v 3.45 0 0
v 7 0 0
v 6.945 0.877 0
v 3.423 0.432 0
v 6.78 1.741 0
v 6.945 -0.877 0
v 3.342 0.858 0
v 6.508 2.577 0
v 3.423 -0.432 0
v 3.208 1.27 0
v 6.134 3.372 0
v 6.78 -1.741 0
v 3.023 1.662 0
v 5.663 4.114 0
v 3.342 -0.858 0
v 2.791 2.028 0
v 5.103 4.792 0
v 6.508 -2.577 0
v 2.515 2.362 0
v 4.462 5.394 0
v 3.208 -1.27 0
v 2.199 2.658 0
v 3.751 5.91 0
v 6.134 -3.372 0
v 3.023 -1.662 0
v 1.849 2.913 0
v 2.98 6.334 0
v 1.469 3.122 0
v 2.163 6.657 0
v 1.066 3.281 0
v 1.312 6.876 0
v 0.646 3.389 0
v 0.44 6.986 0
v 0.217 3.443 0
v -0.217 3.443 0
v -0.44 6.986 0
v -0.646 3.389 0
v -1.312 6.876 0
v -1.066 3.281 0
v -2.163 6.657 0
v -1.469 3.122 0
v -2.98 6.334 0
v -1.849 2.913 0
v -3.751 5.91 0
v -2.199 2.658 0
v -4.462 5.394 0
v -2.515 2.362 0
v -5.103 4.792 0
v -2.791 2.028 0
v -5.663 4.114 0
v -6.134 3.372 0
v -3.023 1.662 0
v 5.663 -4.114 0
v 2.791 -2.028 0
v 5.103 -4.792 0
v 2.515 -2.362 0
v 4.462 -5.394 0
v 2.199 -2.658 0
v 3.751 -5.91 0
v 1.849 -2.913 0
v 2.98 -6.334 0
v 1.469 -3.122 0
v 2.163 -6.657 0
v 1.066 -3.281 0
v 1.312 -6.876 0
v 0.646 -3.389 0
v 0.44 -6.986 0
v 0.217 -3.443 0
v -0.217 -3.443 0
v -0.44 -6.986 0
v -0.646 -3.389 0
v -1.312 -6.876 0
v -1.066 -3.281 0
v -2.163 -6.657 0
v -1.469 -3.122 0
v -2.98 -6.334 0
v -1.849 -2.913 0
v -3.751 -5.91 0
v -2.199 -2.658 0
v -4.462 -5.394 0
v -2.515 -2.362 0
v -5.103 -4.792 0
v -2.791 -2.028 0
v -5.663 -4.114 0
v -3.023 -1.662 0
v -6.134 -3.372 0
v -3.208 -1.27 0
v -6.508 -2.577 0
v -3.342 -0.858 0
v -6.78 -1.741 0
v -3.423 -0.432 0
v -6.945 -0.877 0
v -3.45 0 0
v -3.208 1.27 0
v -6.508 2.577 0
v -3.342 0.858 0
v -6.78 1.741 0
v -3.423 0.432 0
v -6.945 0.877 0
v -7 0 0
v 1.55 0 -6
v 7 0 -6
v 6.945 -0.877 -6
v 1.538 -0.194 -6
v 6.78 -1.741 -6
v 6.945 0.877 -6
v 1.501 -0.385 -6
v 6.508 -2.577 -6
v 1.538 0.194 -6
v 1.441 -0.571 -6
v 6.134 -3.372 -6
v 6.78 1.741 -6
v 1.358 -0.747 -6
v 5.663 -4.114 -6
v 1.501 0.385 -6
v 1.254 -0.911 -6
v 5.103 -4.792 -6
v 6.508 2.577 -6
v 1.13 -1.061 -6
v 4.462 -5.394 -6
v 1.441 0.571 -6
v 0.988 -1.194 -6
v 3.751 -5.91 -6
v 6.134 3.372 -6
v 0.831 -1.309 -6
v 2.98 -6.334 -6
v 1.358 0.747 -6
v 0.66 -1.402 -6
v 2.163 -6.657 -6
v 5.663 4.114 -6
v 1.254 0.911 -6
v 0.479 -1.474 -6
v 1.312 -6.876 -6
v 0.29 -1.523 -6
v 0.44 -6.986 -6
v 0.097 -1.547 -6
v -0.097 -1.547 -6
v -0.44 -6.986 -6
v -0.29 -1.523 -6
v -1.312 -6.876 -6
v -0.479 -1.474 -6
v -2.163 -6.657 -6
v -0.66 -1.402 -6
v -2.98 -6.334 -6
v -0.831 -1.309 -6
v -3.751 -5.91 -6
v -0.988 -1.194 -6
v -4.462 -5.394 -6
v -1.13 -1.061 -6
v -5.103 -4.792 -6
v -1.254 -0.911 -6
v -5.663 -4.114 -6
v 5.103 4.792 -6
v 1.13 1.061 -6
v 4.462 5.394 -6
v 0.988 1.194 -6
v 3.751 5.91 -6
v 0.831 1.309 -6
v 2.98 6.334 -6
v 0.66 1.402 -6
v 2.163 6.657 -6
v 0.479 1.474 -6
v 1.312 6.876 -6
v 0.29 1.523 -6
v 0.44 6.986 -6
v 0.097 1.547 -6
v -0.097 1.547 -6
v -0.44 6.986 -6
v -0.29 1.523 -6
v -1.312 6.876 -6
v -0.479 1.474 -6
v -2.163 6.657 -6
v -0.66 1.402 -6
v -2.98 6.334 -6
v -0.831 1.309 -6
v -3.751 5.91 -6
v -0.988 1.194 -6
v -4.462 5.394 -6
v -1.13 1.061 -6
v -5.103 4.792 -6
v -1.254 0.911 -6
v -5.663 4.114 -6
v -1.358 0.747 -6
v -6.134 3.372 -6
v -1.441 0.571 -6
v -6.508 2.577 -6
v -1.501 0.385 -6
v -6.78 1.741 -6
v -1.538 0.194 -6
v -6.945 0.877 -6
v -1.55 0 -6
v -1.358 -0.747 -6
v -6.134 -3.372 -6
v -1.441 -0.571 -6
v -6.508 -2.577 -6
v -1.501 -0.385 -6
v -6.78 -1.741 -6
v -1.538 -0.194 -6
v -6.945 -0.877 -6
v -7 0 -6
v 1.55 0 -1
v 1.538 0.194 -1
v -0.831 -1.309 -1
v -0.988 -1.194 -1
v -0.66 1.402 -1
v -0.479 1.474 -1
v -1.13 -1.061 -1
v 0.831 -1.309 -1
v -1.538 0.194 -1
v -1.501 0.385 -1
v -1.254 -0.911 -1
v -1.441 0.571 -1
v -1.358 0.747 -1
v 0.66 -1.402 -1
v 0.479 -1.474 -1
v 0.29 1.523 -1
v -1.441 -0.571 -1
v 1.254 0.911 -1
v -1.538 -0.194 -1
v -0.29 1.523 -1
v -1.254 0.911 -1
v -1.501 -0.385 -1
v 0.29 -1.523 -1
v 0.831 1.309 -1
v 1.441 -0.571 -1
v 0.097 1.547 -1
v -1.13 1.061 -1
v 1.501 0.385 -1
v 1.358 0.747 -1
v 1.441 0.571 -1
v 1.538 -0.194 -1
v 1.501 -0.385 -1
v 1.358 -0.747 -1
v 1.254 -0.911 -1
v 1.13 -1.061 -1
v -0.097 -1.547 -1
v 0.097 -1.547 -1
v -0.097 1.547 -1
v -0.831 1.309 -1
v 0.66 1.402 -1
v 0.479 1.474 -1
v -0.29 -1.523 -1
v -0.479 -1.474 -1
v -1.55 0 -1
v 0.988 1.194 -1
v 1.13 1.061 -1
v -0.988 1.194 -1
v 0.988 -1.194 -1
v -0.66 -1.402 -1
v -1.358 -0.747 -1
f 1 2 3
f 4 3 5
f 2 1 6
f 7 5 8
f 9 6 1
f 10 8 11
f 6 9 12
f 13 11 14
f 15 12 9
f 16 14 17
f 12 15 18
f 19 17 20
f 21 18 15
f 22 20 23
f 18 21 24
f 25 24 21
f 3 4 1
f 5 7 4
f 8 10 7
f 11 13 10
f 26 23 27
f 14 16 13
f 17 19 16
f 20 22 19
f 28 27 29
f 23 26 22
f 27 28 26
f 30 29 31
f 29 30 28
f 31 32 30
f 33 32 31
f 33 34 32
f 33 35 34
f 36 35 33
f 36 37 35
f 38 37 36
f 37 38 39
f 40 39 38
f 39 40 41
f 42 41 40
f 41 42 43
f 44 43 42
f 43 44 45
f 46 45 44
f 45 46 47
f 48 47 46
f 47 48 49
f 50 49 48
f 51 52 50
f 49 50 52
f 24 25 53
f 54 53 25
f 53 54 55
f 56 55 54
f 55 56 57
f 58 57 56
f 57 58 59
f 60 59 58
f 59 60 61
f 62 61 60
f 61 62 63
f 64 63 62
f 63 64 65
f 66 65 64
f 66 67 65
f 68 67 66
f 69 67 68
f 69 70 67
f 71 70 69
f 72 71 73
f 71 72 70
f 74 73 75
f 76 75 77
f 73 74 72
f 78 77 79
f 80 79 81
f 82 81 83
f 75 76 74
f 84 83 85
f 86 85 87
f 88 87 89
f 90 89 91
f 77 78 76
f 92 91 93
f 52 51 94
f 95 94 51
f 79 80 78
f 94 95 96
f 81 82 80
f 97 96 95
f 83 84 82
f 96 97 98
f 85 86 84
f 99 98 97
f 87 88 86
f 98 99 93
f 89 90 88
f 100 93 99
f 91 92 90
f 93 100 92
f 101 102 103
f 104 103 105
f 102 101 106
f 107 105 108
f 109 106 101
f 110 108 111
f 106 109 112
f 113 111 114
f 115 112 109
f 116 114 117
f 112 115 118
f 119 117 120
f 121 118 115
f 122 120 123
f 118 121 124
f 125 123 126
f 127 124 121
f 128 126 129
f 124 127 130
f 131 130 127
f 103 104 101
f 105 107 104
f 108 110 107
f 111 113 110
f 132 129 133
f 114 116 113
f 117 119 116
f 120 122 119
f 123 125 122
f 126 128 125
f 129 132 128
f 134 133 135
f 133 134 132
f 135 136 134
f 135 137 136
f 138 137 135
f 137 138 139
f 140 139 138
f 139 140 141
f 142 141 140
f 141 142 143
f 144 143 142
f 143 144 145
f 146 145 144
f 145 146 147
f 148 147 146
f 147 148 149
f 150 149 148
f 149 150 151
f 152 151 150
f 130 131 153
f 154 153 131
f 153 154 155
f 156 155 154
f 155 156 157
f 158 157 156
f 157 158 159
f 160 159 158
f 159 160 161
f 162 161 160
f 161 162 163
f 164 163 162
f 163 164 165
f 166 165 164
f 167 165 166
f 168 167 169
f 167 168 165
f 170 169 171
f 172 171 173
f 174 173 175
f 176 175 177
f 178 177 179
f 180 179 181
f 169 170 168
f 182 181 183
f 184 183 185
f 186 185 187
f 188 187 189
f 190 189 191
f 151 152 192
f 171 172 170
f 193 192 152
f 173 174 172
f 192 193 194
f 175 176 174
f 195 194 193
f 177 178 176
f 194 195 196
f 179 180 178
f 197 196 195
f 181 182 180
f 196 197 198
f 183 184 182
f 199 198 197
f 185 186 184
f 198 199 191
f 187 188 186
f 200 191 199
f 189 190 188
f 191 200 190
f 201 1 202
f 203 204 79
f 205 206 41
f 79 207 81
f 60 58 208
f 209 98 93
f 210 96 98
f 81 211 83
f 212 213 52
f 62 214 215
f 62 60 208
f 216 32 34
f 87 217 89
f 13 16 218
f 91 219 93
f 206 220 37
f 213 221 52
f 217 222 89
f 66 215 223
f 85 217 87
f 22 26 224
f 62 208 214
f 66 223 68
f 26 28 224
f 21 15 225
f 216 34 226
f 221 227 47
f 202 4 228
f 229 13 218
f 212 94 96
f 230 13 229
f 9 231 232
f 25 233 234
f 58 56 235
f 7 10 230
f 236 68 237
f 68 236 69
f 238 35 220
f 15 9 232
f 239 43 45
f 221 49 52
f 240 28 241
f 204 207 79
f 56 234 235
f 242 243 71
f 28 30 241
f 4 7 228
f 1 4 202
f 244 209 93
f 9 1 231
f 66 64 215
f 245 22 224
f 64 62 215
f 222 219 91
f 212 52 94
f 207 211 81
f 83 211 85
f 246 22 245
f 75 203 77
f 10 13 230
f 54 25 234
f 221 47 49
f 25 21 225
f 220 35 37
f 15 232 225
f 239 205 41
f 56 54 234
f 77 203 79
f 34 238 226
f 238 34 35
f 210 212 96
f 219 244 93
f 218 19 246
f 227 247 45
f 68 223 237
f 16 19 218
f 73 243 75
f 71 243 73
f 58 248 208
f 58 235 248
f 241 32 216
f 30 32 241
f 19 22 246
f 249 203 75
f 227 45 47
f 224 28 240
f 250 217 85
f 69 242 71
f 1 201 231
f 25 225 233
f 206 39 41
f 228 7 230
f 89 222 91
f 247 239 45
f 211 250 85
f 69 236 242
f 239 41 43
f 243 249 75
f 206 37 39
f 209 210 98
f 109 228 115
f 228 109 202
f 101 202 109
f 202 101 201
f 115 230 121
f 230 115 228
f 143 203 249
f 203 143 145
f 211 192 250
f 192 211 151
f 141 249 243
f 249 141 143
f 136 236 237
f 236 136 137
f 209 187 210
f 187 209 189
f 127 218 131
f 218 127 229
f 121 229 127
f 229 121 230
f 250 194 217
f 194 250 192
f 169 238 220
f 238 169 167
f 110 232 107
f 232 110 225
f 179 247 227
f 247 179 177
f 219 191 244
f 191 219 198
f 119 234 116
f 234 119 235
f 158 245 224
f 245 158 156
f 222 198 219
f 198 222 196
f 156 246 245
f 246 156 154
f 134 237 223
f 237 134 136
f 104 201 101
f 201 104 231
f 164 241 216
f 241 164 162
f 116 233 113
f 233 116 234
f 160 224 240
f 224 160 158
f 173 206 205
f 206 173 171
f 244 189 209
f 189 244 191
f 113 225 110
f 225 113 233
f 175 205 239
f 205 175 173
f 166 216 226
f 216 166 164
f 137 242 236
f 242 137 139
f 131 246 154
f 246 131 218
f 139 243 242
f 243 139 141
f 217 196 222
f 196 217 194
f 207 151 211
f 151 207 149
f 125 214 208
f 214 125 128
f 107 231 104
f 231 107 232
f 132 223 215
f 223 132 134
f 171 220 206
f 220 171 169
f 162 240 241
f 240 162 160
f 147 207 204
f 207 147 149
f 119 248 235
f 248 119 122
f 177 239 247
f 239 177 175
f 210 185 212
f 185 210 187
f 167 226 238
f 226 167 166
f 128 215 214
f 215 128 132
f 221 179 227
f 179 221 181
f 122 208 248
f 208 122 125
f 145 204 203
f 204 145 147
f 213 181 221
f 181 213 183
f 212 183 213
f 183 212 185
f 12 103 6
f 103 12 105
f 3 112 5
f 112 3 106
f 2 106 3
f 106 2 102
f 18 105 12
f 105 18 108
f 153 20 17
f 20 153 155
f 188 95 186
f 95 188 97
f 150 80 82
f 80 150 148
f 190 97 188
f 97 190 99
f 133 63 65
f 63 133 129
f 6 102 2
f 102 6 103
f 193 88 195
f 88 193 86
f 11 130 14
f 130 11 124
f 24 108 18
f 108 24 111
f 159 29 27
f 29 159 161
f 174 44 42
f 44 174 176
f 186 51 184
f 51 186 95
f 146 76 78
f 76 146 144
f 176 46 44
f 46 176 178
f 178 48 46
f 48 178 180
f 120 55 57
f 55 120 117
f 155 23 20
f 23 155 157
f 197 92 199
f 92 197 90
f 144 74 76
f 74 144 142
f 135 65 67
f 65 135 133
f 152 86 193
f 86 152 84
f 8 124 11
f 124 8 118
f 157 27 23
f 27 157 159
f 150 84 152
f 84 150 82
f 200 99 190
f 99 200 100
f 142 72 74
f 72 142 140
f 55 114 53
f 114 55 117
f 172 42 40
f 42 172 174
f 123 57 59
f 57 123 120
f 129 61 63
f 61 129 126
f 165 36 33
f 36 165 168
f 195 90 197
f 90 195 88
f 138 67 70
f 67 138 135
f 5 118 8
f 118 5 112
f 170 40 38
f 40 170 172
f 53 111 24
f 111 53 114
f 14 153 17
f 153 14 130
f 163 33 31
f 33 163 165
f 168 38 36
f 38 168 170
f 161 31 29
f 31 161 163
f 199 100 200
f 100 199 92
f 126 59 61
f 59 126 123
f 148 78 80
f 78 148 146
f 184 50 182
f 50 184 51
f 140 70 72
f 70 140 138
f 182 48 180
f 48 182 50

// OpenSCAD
$fn = 50;


difference() {
	union() {
		translate(v = [0, 0, -6.0000000000]) {
			cylinder(h = 6, r = 7.0000000000);
		}
	}
	union() {
		translate(v = [0, 0, 0]) {
			rotate(a = [0, 0, 0]) {
				difference() {
					union() {
						translate(v = [0, 0, -6.0000000000]) {
							cylinder(h = 6, r = 1.2500000000);
						}
						translate(v = [0, 0, -1.0000000000]) {
							cylinder(h = 1.0000000000, r1 = 1.5500000000, r2 = 3.4500000000);
						}
						translate(v = [0, 0, -6.0000000000]) {
							cylinder(h = 6, r = 1.5500000000);
						}
						translate(v = [0, 0, -6.0000000000]) {
							cylinder(h = 6, r = 1.2500000000);
						}
					}
					union();
				}
			}
		}
	}
}
